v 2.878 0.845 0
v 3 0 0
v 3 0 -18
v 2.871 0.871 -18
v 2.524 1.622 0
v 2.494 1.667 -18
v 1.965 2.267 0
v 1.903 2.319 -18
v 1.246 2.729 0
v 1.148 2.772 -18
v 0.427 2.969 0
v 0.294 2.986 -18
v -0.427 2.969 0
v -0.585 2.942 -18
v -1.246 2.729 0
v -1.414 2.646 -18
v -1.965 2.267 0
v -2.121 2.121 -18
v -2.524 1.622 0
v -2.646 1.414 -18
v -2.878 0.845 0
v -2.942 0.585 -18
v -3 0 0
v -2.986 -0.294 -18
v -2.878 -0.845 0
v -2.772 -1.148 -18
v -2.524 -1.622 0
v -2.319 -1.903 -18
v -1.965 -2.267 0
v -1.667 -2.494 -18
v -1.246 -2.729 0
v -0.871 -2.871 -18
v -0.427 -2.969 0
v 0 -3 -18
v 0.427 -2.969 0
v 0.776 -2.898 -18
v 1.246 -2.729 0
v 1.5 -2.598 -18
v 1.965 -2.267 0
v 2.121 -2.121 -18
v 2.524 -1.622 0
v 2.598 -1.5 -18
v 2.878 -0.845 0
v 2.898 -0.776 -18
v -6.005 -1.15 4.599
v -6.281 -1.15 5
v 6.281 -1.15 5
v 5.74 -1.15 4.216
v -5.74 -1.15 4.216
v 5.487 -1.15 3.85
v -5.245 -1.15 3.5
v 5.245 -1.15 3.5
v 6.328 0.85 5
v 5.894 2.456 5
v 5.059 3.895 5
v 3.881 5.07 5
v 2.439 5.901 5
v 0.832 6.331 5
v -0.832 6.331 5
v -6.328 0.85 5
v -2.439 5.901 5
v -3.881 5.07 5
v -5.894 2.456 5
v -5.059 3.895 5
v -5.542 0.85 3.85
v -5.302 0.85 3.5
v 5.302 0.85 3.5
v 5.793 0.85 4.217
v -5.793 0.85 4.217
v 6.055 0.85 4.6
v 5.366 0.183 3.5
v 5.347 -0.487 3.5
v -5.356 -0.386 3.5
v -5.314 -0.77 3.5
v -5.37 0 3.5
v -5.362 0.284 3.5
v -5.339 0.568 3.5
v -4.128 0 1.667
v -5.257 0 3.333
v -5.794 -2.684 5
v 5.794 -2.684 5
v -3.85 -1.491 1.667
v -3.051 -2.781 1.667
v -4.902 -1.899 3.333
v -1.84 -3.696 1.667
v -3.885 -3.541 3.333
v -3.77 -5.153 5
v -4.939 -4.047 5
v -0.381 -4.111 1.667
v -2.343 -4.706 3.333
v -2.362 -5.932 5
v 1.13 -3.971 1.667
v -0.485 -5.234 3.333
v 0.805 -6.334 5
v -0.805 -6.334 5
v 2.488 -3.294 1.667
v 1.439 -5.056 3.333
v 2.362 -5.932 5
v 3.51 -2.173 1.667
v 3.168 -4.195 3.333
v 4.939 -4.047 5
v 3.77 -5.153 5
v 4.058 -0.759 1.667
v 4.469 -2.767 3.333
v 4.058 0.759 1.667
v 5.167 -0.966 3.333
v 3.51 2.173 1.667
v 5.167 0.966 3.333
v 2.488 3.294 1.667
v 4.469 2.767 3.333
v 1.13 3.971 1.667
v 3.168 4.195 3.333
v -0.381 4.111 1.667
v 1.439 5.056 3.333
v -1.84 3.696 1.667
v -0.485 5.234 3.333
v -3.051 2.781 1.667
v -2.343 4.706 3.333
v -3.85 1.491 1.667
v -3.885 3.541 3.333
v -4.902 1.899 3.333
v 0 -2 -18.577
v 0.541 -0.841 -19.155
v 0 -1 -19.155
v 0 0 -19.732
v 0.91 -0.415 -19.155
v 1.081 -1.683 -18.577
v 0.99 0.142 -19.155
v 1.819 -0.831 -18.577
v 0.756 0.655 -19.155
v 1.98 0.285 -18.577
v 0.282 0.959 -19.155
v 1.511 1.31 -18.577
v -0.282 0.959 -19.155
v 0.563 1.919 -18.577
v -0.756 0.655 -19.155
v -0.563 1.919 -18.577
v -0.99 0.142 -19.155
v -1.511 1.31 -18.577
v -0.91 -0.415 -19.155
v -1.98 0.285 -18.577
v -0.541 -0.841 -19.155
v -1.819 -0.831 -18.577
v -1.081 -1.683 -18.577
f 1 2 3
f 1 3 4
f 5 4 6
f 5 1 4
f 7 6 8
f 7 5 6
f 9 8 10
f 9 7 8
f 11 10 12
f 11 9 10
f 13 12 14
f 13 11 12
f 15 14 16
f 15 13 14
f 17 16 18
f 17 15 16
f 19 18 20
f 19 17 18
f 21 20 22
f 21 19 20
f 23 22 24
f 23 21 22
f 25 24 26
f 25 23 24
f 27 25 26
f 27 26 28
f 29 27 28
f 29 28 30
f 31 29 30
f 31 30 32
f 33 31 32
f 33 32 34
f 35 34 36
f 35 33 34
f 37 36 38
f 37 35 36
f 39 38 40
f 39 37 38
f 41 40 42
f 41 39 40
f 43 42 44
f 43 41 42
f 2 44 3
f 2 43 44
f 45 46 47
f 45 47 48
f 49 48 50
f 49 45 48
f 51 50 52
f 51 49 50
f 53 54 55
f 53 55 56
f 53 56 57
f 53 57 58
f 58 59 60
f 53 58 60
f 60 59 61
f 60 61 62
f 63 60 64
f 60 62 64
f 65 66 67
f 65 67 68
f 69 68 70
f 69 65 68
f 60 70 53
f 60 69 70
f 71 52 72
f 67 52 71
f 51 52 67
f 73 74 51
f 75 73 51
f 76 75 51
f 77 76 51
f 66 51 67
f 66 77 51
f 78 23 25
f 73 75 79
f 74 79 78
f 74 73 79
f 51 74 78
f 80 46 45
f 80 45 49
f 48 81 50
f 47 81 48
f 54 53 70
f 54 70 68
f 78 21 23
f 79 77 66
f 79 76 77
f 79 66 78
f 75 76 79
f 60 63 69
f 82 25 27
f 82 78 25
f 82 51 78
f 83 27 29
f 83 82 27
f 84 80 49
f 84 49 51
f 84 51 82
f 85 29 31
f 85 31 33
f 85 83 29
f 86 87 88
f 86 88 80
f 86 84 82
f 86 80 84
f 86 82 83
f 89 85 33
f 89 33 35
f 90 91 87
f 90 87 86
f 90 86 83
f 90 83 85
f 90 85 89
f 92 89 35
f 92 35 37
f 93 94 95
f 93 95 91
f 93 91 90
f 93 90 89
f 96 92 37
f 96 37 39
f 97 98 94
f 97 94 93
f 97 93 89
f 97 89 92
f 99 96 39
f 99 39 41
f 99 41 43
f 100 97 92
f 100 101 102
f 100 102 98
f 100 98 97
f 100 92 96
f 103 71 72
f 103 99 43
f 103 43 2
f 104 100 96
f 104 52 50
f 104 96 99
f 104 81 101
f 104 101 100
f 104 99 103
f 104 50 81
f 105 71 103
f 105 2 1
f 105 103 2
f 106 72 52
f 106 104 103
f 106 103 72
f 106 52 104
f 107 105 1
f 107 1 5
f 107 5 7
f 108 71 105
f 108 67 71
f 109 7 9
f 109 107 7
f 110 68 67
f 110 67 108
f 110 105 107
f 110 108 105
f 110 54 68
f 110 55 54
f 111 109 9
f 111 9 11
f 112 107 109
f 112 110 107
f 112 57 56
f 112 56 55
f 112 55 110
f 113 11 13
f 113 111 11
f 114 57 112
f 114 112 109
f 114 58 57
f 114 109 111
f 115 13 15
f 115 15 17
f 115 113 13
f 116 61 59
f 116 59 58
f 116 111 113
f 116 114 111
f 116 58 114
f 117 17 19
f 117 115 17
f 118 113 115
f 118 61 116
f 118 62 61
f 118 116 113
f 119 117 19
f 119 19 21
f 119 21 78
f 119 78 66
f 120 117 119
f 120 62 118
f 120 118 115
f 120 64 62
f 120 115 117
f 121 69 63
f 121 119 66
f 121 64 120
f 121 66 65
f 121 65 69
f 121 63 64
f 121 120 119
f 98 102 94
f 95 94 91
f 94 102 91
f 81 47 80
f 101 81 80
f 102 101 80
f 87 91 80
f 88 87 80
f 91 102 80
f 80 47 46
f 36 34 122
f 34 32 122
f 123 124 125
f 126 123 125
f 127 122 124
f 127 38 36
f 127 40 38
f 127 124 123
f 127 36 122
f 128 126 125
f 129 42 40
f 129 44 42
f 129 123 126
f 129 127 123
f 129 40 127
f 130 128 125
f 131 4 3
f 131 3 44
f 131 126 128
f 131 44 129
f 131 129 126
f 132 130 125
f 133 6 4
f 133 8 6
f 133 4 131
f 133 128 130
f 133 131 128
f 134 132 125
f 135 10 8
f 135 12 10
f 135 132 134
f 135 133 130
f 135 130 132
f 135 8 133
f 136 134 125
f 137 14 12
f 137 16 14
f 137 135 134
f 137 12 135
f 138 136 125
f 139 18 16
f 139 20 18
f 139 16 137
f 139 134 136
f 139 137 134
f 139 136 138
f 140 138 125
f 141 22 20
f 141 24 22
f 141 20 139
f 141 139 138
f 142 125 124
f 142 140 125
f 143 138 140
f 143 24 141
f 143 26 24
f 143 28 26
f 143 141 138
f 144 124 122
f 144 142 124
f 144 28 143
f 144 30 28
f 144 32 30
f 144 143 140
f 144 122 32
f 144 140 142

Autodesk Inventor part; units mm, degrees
ref_plane "YZ Plane" through (0, 0, 0) normal (1, 0, 0) x (0, 1, 0)
ref_plane "XZ Plane" through (0, 0, 0) normal (0, 1, 0) x (-1, 0, 0)
ref_plane "XY Plane" through (0, 0, 0) normal (0, 0, 1) x (1, 0, 0)
sketch "Sketch3" plane through (0, 0, 0) normal (0, 0, 1) x (1, 0, 0)
  circle A0 centre (0, 0) radius 3
  dimension "d9" = 6
extrude "Extrusion1" add sketch "Sketch3" against normal blind 18
sketch "Sketch4" plane through (0, 0, 0) normal (1, 0, 0) x (0, 1, 0)
  line L0 (-3, -18) -> (3, -18) projected
  line L1 (0, -19.7321) -> (3, -18)
  line L2 (0, -18) -> (0, -19.7321)
  point P0 (0, 0)
revolve "Revolution1" add sketch "Sketch4" angle 360 mid plane about axis through (0, 0, -18) along (0, 0, -1)
sketch "Sketch5" plane through (0, 0, 0) normal (0, 1, 0) x (-1, 0, 0)
  line L0 (3, 0) -> (-3, 0) projected
  line L1 (3, 0) -> (6.385, 5)
  line L2 (6.385, 5) -> (0, 5)
  line L3 (0, 5) -> (0, 0)
  dimension "d14" = 5
  dimension "d15" = 6.385
revolve "Revolution2" add sketch "Sketch5" angle 360 about axis through (0, 0, 5) along (0, 0, -1)
sketch "Sketch6" plane through (0, 0, 0) normal (1, 0, 0) x (0, 1, 0)
  line L0 (-6.385, 5) -> (6.385, 5) projected
  line L1 (-1.15, 5) -> (-1.15, 3.5)
  line L2 (-1.15, 3.5) -> (-0.15, 3.5)
  line L3 (-0.15, 3.5) -> (0.85, 3.5)
  line L4 (0.85, 3.5) -> (0.85, 5)
  point P0 (0, 0)
  dimension "d17" = 1
  dimension "d18" = 1.5
extrude "Extrusion2" cut sketch "Sketch6" along normal mid plane 20
properties part number "Pieza7_tornillo" material "Iron, Cast"
